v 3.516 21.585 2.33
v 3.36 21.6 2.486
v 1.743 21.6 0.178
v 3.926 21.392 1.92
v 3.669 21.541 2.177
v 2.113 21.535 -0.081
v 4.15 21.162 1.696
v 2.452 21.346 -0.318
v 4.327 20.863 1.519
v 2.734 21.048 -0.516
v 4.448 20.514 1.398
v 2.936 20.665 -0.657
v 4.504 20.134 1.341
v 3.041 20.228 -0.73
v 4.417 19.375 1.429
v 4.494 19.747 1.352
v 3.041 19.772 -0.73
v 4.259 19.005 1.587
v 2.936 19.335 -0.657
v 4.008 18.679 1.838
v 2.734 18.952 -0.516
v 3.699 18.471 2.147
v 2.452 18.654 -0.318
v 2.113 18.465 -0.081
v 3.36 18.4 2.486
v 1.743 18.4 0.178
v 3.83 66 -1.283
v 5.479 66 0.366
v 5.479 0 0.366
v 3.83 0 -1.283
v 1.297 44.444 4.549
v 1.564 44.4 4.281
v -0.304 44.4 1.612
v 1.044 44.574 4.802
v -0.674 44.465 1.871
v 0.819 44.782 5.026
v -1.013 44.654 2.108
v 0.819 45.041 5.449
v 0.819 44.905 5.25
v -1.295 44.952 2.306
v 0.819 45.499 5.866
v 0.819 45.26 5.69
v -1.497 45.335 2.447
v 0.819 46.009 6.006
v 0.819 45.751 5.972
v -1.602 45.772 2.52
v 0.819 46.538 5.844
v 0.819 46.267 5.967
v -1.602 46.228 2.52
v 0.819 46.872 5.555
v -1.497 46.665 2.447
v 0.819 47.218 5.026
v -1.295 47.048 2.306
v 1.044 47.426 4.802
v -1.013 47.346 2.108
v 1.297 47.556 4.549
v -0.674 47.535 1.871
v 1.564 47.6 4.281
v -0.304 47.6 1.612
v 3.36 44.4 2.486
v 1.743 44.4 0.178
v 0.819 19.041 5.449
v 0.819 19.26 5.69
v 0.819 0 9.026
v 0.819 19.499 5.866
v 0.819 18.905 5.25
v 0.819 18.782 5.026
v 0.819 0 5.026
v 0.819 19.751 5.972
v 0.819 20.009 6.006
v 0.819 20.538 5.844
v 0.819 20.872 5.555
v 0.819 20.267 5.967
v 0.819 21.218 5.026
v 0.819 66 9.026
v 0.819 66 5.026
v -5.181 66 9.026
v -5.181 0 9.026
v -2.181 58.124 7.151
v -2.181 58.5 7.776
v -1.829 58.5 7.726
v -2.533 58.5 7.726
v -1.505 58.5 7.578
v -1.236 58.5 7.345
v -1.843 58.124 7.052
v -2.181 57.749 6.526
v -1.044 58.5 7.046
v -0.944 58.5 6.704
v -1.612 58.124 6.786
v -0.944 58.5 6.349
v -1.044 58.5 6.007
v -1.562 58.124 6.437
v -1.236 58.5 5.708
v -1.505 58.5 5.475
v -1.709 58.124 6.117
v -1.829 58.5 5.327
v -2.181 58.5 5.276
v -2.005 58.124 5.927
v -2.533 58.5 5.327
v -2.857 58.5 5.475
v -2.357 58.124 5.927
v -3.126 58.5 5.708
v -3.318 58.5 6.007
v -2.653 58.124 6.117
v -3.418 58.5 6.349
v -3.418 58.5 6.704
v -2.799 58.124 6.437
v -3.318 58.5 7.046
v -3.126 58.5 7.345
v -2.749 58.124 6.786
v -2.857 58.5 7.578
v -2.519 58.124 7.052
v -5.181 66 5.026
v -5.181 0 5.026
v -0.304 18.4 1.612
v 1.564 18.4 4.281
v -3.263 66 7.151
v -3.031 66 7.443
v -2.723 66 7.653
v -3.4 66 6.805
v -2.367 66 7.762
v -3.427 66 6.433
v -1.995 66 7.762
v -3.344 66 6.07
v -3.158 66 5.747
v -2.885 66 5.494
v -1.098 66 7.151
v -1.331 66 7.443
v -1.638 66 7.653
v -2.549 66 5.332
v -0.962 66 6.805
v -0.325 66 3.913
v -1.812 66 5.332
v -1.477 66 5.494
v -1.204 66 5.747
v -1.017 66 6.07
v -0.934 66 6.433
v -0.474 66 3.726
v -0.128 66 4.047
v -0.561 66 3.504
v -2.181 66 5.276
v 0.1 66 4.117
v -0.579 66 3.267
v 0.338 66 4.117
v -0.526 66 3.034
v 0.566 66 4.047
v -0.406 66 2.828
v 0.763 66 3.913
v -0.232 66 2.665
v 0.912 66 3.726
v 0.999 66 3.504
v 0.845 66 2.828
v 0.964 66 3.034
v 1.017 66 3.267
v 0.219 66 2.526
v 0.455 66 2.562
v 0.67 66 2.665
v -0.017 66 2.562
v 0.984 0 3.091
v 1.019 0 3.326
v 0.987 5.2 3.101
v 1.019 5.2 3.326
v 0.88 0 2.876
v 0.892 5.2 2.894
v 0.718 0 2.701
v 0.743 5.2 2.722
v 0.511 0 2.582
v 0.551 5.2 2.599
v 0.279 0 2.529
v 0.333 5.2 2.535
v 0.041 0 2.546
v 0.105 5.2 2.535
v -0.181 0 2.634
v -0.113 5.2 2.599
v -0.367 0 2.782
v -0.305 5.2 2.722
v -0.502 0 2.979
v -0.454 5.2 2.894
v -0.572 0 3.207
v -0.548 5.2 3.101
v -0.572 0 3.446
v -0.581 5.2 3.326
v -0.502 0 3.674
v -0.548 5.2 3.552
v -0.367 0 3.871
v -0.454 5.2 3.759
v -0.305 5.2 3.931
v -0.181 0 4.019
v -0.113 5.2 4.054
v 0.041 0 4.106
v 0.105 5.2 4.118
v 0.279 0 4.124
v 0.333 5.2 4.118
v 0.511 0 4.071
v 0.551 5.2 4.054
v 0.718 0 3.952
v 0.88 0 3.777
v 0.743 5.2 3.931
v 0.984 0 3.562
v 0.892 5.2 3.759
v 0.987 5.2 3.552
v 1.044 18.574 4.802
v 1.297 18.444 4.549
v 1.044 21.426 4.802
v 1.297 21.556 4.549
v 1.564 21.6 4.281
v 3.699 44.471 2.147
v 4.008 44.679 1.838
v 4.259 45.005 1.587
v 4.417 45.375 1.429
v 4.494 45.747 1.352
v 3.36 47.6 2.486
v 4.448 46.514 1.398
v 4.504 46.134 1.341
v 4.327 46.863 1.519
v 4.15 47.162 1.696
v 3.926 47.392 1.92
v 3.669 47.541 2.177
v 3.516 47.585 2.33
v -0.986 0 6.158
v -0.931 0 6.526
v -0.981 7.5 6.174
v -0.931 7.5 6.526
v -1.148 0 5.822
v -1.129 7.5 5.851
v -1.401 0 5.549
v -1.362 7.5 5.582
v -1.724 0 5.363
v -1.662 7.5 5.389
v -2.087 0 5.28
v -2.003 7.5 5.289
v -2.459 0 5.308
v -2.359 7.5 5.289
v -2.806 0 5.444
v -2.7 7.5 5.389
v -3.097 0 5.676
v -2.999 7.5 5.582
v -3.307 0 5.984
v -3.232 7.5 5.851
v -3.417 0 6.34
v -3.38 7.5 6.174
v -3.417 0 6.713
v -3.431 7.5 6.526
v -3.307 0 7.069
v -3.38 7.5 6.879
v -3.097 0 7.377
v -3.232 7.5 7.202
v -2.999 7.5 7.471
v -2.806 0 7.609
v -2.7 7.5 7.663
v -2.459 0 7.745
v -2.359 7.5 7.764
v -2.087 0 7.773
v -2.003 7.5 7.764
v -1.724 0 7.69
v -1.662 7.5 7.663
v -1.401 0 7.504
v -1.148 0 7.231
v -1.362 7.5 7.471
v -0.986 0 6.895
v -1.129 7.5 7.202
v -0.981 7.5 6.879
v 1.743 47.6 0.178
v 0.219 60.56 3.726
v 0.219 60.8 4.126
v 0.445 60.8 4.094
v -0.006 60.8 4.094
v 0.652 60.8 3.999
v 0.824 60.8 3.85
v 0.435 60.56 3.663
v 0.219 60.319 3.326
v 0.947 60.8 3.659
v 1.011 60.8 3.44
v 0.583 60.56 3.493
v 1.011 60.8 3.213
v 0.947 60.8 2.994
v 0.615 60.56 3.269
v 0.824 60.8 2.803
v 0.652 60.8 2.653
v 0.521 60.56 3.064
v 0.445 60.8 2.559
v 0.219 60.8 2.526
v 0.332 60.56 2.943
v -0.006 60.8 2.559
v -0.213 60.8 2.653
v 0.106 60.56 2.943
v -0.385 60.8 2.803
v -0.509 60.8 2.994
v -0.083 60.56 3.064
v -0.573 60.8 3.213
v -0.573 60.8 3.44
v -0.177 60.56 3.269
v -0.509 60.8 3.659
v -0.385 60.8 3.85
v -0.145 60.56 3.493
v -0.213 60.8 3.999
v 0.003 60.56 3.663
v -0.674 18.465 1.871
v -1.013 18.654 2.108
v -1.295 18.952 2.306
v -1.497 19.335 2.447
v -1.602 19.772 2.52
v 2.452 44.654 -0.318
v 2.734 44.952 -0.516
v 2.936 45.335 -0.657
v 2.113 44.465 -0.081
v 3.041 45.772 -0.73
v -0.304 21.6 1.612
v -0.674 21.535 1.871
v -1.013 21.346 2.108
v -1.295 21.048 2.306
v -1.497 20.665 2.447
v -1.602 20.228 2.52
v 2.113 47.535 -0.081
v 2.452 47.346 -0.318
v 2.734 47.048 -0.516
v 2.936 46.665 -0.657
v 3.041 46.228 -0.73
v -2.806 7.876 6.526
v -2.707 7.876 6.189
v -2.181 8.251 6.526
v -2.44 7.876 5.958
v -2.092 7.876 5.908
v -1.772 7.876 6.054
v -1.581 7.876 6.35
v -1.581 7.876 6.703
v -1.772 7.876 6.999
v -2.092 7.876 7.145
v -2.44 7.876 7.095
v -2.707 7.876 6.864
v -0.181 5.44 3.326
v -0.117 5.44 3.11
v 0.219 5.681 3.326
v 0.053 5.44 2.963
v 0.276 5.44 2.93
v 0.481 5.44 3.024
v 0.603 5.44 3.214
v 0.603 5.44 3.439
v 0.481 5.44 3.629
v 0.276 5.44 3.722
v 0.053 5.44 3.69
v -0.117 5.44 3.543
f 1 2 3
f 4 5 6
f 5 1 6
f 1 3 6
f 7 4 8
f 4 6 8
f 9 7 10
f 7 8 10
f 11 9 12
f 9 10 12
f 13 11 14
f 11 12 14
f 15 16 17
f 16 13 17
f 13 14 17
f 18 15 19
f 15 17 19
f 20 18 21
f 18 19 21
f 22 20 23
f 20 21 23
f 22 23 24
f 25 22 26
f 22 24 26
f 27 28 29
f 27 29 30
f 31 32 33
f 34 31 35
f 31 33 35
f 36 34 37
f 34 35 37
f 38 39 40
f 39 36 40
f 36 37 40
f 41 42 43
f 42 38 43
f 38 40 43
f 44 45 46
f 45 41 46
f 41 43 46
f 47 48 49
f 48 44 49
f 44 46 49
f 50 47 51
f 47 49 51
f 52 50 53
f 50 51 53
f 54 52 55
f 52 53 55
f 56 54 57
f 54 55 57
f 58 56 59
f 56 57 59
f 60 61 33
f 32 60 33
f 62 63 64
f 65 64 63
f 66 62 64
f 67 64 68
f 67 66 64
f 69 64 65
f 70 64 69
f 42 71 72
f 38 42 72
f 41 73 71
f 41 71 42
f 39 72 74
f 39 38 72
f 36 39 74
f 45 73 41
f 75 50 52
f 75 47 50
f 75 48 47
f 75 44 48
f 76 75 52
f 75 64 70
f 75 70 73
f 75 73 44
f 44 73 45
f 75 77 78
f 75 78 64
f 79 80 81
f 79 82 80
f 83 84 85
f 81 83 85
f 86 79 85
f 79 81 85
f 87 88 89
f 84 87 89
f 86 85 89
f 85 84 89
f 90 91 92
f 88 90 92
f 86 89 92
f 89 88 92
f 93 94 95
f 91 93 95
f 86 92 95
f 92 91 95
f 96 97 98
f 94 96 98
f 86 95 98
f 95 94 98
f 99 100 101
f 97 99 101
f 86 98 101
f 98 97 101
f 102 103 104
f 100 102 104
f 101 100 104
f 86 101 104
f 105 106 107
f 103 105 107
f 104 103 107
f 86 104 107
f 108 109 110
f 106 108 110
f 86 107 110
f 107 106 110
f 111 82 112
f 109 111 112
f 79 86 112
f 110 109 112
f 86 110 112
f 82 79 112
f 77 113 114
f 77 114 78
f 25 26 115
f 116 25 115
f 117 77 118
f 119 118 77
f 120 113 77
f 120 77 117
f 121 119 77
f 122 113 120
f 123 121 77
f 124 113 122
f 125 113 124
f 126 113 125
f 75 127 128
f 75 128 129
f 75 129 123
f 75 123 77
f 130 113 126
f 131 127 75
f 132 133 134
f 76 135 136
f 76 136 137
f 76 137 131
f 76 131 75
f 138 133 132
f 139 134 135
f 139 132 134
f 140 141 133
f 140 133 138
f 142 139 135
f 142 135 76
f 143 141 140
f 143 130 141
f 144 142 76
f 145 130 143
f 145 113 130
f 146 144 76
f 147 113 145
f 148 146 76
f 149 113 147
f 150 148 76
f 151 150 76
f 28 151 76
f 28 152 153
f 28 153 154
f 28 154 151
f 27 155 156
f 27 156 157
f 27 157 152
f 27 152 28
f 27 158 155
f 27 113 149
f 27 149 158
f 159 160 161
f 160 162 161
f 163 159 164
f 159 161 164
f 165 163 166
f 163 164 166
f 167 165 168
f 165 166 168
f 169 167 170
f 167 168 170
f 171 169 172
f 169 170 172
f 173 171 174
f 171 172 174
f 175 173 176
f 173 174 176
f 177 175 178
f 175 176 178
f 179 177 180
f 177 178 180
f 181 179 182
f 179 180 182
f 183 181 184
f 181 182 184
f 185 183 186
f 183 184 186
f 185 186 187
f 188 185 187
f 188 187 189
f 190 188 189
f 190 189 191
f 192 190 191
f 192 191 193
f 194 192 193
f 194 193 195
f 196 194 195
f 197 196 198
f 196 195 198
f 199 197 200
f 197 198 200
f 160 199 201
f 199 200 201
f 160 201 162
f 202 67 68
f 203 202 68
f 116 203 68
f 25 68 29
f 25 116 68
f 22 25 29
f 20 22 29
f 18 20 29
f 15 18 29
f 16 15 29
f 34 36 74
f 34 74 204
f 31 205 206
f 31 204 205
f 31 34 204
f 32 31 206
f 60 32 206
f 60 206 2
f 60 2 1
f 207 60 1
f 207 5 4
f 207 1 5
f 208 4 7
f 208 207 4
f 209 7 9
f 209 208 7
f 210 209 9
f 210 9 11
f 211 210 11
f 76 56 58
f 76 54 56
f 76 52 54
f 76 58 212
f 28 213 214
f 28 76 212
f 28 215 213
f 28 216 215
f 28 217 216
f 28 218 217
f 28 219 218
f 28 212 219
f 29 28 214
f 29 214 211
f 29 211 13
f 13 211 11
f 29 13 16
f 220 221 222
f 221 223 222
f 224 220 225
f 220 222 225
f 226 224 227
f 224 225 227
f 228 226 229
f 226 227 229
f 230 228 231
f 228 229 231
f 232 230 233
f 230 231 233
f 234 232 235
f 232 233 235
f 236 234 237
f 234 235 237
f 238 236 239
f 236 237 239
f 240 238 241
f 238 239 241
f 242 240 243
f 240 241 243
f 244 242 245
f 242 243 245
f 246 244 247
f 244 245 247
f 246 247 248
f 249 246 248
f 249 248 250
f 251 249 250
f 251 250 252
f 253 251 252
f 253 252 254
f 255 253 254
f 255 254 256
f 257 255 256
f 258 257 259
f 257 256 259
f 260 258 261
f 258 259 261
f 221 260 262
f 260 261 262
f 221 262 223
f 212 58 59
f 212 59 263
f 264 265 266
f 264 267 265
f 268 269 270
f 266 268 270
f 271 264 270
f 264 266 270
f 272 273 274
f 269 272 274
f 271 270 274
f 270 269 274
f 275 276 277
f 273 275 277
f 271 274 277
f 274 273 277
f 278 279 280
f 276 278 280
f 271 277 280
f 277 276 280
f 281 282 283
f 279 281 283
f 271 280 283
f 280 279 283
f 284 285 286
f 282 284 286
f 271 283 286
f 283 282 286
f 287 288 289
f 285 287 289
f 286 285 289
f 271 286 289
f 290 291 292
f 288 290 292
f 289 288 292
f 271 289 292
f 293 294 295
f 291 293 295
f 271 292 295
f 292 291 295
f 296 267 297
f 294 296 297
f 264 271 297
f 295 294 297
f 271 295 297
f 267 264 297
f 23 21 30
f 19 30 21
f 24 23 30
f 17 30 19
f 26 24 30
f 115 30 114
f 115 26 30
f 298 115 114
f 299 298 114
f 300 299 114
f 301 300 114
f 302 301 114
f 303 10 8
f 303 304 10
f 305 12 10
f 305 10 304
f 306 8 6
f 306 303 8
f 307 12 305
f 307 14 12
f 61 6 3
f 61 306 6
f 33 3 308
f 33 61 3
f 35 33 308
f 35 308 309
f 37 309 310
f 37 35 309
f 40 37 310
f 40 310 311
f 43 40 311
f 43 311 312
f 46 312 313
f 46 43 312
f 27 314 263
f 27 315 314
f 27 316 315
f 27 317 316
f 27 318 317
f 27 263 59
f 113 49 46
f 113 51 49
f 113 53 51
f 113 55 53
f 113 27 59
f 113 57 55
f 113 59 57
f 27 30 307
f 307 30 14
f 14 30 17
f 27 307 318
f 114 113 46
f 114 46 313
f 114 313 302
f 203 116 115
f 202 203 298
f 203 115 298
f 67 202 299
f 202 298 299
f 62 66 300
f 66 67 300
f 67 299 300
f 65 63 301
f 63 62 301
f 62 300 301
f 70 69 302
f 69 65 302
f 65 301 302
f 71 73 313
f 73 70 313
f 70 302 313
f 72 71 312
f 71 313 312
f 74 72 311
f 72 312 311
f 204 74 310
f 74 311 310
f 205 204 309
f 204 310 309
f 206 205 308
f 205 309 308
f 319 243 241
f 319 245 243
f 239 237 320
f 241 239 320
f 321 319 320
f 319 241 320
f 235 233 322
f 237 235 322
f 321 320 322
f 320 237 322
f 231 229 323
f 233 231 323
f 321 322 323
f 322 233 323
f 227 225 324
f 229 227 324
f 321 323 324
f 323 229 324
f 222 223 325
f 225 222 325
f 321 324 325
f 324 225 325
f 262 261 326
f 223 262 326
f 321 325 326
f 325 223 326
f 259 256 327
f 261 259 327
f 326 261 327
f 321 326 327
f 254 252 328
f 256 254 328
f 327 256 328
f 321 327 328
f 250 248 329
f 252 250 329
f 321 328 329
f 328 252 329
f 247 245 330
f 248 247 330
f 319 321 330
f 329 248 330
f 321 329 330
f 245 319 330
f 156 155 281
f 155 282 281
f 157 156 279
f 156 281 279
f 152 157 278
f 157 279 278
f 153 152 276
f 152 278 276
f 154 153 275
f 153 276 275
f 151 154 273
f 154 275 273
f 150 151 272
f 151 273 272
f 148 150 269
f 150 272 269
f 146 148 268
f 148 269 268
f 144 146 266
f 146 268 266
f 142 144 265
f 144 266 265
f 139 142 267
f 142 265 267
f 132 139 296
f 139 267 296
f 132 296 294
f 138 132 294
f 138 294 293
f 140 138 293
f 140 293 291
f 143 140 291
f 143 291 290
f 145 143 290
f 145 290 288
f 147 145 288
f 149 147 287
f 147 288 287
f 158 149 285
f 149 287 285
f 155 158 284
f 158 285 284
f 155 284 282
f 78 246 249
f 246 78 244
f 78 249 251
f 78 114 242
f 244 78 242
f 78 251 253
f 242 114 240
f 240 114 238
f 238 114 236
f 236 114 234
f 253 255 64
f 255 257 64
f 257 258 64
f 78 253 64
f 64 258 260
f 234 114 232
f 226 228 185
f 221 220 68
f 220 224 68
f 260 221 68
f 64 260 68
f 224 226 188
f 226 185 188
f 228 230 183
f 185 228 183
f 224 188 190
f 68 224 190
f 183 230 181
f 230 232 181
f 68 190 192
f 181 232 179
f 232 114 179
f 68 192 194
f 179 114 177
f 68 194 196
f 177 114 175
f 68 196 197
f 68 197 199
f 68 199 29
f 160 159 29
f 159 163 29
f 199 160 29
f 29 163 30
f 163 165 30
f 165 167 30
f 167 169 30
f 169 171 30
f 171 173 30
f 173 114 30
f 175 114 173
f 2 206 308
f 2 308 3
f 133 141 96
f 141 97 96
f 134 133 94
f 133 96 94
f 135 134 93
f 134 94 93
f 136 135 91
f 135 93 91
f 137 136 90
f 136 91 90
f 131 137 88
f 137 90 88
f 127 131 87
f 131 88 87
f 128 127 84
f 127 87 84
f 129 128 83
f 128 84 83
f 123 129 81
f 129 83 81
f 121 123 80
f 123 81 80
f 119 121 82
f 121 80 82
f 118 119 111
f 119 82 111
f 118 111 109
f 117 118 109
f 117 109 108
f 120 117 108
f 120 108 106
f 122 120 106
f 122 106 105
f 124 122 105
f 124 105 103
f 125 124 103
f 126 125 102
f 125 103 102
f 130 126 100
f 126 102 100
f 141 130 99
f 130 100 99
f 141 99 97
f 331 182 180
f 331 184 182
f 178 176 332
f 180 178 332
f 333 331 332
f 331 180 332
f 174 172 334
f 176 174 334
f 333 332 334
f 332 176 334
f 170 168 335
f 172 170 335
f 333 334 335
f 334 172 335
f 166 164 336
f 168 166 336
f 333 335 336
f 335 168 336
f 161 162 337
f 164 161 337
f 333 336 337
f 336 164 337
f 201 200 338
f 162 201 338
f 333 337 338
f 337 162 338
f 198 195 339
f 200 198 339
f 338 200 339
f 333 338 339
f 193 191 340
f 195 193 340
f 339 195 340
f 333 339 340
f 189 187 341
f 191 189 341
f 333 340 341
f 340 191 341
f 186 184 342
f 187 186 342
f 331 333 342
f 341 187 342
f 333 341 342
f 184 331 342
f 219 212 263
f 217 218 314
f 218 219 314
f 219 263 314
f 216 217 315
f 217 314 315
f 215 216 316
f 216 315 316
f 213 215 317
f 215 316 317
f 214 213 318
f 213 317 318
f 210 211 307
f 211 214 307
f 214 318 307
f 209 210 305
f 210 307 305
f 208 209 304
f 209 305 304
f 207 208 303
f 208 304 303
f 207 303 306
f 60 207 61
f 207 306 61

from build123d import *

# Parameters (mm, degrees)
BOSS_EXTRUDE1_DEPTH       = 66
M3X0_5_TAPPED_HOLE1_D     = 2.5
M3X0_5_TAPPED_HOLE1_DEPTH = 7.5
M3X0_5_TAPPED_HOLE1_TIP   = 0.751075774
M2X0_4_TAPPED_HOLE1_D     = 1.6
M2X0_4_TAPPED_HOLE1_DEPTH = 5.2
M2X0_4_TAPPED_HOLE1_TIP   = 0.480688495
M3X0_5_TAPPED_HOLE2_D     = 2.5
M3X0_5_TAPPED_HOLE2_DEPTH = 7.5
M3X0_5_TAPPED_HOLE2_TIP   = 0.751075774
M2X0_4_TAPPED_HOLE2_D     = 1.6
M2X0_4_TAPPED_HOLE2_DEPTH = 5.2
M2X0_4_TAPPED_HOLE2_TIP   = 0.480688495
CUT_EXTRUDE1_DEPTH        = 67.749502158


with BuildPart() as part:
    # Sketch1 → Boss-Extrude1 (new body)
    with BuildSketch(Plane(origin=(0, 66, 0), x_dir=(1, 0, 0), z_dir=(0, 1, 0))):
        Polygon((3.829824533, 1.282917234), (-5.180847956, -5.026423564), (-5.180847956, -9.026423564), (0.819152044, -9.026423564), (0.819152044, -5.026423564), (5.479158688, -0.366416921), align=None)
    extrude(amount=-BOSS_EXTRUDE1_DEPTH)

    # M3x0.5 Tapped Hole1
    with Locations(Plane(origin=(0, 0, 0), x_dir=(-1, 0, 0), z_dir=(0, -1, 0))):
        with Locations((2.180847956, -6.526423564)):
            Hole(M3X0_5_TAPPED_HOLE1_D / 2, depth=M3X0_5_TAPPED_HOLE1_DEPTH)
            with Locations((0, 0, -(M3X0_5_TAPPED_HOLE1_DEPTH + M3X0_5_TAPPED_HOLE1_TIP / 2))):  # 118° drill point
                Cone(0, M3X0_5_TAPPED_HOLE1_D / 2, M3X0_5_TAPPED_HOLE1_TIP, mode=Mode.SUBTRACT)

    # M2x0.4 Tapped Hole1
    with Locations(Plane(origin=(0, 0, 0), x_dir=(-1, 0, 0), z_dir=(0, -1, 0))):
        with Locations((-0.219152044, -3.326423564)):
            Hole(M2X0_4_TAPPED_HOLE1_D / 2, depth=M2X0_4_TAPPED_HOLE1_DEPTH)
            with Locations((0, 0, -(M2X0_4_TAPPED_HOLE1_DEPTH + M2X0_4_TAPPED_HOLE1_TIP / 2))):  # 118° drill point
                Cone(0, M2X0_4_TAPPED_HOLE1_D / 2, M2X0_4_TAPPED_HOLE1_TIP, mode=Mode.SUBTRACT)

    # M3x0.5 Tapped Hole2
    with Locations(Plane(origin=(-2.180847956, 66, 6.526423564), x_dir=(0, 0, 1), z_dir=(0, 1, 0))):
        with Locations((0, 0)):
            Hole(M3X0_5_TAPPED_HOLE2_D / 2, depth=M3X0_5_TAPPED_HOLE2_DEPTH)
            with Locations((0, 0, -(M3X0_5_TAPPED_HOLE2_DEPTH + M3X0_5_TAPPED_HOLE2_TIP / 2))):  # 118° drill point
                Cone(0, M3X0_5_TAPPED_HOLE2_D / 2, M3X0_5_TAPPED_HOLE2_TIP, mode=Mode.SUBTRACT)

    # M2x0.4 Tapped Hole2
    with Locations(Plane(origin=(0.219152044, 66, 3.326423564), x_dir=(0, 0, 1), z_dir=(0, 1, 0))):
        with Locations((0, 0)):
            Hole(M2X0_4_TAPPED_HOLE2_D / 2, depth=M2X0_4_TAPPED_HOLE2_DEPTH)
            with Locations((0, 0, -(M2X0_4_TAPPED_HOLE2_DEPTH + M2X0_4_TAPPED_HOLE2_TIP / 2))):  # 118° drill point
                Cone(0, M2X0_4_TAPPED_HOLE2_D / 2, M2X0_4_TAPPED_HOLE2_TIP, mode=Mode.SUBTRACT)

    # Sketch12 → Cut-Extrude1 (cut, through all)
    with BuildSketch(Plane(origin=(0.657199769, 0, 0.938578541), x_dir=(-0.8191520444364442, 0, 0.5735764361404623), z_dir=(-0.5735764361404623, 0, -0.8191520444364442))):
        with BuildLine():
            Line((-1.325998276, 44.400000009), (1.174001724, 44.400000009))
            ThreePointArc((1.174001724, 44.400000009), (2.774001716, 46.000000001), (1.174001724, 47.599999993))
            Line((1.174001724, 47.599999993), (-1.325998276, 47.599999993))
            ThreePointArc((-1.325998276, 47.599999993), (-2.925998268, 46.000000001), (-1.325998276, 44.400000009))
        make_face()
        with BuildLine():
            Line((-1.325998276, 18.400000007), (1.174001724, 18.400000007))
            ThreePointArc((1.174001724, 18.400000007), (2.774001716, 19.999999999), (1.174001724, 21.599999991))
            Line((1.174001724, 21.599999991), (-1.325998276, 21.599999991))
            ThreePointArc((-1.325998276, 21.599999991), (-2.925998268, 19.999999999), (-1.325998276, 18.400000007))
        make_face()
    extrude(amount=-CUT_EXTRUDE1_DEPTH, mode=Mode.SUBTRACT)


solid = part.part
